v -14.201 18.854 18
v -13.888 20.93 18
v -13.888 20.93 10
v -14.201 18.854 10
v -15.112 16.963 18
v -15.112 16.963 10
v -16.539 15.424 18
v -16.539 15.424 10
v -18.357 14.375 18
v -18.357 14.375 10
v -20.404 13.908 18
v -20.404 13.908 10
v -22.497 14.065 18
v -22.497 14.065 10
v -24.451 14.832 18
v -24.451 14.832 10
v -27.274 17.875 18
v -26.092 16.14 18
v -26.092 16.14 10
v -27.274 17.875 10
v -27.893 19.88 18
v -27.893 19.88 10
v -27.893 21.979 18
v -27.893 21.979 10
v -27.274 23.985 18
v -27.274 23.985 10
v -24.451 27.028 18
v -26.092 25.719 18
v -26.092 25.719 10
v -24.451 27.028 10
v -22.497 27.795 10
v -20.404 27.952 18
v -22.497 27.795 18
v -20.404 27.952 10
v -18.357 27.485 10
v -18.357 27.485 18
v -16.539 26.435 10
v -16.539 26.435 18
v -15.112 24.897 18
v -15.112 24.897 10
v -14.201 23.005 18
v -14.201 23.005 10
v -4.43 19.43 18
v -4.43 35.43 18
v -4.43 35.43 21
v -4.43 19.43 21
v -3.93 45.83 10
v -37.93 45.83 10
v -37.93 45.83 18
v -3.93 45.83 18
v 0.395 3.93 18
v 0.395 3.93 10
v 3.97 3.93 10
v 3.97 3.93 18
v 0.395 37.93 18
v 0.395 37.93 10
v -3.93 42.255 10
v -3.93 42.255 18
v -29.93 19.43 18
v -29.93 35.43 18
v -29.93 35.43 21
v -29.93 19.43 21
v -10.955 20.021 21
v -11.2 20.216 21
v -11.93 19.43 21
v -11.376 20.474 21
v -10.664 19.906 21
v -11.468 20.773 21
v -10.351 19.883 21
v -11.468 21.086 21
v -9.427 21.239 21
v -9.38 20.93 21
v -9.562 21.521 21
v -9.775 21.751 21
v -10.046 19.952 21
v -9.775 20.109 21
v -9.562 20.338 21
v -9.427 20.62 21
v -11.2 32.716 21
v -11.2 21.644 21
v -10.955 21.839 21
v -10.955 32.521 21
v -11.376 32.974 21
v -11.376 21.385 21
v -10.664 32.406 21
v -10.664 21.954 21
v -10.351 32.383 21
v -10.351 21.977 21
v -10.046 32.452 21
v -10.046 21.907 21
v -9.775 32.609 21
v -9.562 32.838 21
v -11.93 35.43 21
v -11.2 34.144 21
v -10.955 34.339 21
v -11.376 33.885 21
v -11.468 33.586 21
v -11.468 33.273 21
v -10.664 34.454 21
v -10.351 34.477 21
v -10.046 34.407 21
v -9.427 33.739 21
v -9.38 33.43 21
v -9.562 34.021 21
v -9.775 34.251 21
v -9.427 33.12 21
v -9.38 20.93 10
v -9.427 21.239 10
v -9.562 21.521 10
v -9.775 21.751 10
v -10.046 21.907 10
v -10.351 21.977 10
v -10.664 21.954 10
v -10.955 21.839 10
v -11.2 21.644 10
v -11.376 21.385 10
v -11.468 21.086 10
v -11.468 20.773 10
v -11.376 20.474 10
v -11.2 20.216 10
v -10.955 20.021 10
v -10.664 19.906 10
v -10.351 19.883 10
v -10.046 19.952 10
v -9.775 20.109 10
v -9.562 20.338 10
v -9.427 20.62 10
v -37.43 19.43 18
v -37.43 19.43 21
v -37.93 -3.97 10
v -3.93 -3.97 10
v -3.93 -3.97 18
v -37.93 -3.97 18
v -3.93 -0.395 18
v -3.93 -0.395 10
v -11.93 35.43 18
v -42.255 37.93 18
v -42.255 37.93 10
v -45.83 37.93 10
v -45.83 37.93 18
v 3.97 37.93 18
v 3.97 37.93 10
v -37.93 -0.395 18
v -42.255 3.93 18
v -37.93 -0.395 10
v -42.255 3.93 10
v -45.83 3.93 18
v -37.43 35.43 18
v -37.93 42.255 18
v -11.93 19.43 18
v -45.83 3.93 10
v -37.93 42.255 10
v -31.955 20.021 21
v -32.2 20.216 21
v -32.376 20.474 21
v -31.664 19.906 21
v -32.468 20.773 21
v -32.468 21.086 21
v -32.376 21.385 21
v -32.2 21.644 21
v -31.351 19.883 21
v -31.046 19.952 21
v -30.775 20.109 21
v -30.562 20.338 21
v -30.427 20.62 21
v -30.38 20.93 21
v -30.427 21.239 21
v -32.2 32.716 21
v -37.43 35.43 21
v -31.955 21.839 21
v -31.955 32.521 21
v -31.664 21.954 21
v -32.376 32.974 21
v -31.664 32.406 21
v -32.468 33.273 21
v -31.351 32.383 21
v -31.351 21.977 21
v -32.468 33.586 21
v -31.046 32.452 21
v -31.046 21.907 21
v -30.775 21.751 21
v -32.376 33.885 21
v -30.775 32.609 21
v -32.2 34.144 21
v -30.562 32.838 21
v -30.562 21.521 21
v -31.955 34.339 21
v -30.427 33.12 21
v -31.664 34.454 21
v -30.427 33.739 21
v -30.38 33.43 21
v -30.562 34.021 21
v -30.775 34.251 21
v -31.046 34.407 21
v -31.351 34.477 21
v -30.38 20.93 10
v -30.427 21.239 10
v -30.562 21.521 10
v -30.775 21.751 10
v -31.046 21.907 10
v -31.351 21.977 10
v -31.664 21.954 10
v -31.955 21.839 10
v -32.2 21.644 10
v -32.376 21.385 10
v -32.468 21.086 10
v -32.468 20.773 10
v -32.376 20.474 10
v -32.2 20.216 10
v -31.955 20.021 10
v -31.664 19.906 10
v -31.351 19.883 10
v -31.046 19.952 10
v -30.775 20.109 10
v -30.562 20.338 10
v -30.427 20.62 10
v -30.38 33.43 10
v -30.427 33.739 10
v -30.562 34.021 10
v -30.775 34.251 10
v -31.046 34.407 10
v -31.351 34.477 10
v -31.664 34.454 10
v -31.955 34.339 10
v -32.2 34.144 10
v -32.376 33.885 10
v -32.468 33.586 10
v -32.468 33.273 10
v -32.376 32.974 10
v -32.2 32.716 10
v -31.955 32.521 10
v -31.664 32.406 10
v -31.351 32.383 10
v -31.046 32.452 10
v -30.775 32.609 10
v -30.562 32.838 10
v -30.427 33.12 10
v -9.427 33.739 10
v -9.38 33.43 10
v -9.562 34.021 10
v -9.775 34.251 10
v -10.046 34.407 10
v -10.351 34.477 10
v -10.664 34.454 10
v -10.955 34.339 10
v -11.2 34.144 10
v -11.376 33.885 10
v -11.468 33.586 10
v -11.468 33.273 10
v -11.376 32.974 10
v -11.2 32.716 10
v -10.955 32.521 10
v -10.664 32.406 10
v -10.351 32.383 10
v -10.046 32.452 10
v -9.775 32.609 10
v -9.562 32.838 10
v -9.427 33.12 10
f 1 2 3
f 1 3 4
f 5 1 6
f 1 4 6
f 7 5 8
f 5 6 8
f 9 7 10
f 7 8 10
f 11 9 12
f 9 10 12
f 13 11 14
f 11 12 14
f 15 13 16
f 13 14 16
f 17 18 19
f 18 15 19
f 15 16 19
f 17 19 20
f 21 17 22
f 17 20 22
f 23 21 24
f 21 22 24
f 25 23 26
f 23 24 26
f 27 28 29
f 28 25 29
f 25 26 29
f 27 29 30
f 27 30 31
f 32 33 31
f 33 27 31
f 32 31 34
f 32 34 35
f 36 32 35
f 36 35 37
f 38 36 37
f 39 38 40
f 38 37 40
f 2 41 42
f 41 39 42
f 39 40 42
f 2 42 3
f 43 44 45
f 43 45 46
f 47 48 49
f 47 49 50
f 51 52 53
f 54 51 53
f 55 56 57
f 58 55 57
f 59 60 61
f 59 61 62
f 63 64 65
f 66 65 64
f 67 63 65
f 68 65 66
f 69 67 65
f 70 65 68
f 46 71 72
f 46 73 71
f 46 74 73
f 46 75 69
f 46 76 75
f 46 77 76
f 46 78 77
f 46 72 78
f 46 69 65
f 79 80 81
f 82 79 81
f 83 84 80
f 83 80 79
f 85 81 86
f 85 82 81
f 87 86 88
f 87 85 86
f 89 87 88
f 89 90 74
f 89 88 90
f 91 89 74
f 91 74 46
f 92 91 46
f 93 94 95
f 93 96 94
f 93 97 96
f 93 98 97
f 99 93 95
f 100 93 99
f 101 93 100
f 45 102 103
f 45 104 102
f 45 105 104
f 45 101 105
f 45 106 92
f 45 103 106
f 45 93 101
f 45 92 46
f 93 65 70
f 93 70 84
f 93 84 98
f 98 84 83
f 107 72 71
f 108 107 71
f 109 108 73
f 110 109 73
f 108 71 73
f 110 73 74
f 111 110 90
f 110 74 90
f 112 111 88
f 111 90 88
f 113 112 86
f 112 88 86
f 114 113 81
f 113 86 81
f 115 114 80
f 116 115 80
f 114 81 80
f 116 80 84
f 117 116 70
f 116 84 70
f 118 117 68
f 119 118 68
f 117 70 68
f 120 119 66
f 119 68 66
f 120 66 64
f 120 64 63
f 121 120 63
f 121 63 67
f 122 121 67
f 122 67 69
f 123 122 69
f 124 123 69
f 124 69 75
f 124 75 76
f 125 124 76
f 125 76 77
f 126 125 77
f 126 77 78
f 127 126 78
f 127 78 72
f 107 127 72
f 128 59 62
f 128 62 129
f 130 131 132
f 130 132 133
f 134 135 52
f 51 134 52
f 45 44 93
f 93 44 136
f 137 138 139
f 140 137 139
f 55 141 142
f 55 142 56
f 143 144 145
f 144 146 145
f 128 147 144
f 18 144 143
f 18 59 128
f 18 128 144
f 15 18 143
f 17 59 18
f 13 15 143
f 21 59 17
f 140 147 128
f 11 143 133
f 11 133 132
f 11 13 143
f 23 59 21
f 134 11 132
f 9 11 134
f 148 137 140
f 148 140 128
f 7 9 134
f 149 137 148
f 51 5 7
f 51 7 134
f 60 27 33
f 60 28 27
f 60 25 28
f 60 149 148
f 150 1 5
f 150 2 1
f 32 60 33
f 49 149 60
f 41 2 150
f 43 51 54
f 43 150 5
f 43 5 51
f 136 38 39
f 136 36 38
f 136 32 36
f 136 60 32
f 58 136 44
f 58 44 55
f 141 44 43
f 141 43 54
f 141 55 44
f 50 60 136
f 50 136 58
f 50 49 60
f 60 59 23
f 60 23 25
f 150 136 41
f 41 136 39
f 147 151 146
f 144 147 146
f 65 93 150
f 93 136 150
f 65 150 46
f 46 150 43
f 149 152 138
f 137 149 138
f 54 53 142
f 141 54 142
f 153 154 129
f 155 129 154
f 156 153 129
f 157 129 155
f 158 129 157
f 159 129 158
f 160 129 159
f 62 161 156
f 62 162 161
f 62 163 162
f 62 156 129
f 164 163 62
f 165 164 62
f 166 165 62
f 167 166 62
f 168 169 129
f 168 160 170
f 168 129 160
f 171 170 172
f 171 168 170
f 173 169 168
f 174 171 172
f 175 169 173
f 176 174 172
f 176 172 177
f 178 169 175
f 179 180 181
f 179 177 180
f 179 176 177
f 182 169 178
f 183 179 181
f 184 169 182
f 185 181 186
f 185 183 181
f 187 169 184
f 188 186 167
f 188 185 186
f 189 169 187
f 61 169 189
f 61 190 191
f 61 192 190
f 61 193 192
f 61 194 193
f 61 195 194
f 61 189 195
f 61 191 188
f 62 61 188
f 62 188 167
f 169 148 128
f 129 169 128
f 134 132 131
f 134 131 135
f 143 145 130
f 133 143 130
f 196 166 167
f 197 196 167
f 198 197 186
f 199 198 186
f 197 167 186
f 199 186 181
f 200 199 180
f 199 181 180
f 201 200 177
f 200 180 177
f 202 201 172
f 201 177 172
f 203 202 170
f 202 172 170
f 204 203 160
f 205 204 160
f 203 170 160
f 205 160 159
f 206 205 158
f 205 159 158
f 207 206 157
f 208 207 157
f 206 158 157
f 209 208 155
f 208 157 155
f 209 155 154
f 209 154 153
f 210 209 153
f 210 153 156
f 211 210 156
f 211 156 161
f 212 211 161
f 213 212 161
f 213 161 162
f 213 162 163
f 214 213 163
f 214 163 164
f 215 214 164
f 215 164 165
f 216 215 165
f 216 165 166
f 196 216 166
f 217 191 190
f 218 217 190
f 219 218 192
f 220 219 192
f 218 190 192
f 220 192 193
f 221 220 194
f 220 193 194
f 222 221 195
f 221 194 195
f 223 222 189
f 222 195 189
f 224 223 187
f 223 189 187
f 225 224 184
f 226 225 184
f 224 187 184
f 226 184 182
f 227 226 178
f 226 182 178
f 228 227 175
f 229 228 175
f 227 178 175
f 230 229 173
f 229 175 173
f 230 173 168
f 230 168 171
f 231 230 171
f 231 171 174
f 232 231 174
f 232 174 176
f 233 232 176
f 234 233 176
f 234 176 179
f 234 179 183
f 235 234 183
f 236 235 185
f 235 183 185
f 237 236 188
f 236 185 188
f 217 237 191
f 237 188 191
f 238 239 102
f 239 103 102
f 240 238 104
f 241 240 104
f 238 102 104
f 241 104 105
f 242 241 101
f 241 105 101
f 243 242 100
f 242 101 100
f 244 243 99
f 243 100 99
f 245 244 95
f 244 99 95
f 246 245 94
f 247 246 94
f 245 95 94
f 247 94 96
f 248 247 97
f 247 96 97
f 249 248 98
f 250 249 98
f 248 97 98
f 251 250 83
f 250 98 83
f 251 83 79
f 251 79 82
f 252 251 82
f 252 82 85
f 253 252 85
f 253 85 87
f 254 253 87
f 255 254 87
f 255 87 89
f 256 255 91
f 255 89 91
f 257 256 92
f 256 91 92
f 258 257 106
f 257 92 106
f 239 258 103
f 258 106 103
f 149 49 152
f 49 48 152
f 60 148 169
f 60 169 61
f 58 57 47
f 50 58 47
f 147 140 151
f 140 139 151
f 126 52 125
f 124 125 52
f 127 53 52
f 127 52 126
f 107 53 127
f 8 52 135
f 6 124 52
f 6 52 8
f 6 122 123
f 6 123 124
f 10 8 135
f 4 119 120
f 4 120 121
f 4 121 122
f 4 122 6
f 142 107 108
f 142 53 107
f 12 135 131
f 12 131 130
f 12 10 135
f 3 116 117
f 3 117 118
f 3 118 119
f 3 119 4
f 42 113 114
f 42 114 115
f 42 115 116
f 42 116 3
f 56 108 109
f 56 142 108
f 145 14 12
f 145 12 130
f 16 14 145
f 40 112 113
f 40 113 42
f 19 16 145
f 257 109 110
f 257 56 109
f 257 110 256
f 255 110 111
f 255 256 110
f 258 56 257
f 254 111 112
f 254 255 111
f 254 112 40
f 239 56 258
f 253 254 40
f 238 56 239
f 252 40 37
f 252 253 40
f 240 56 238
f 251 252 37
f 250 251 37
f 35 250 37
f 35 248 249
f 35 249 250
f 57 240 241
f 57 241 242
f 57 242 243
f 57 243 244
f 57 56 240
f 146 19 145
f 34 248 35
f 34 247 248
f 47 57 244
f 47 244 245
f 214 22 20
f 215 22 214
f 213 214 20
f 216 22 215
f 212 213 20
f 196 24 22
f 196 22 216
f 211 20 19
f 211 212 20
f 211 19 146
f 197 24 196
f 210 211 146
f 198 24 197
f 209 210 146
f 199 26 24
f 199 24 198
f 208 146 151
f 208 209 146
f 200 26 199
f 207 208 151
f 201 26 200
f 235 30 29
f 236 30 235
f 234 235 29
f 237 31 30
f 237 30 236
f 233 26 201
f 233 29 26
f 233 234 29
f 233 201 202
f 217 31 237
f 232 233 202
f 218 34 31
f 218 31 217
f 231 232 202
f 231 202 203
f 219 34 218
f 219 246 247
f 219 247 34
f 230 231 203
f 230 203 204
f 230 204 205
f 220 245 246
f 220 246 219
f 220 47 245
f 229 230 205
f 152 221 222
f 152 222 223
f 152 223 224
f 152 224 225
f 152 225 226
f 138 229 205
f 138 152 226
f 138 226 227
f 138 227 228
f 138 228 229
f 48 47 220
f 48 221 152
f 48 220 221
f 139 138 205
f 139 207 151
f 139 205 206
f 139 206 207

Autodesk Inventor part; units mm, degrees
ref_plane "YZ Plane" through (0, 0, 0) normal (1, 0, 0) x (0, 1, 0)
ref_plane "Work Plane1" through (0, 0, 10) normal (0, 0, 1) x (1, 0, 0)
sketch "Sketch1" plane through (0, 0, 10) normal (0, 0, 1) x (1, 0, 0)
  line L0 (-4.0299, -0.3538) -> (-2.2322, 1.4439) construction
  arc A0 (-1.4439, 2.2322) -> (-2.2322, 1.4439) centre (-0.9299, 0.9299) ccw construction
  line L1 (-1.4439, 2.2322) -> (0.3538, 4.0299) construction
  line L2 (-37.8299, 42.2137) -> (-37.8299, 45.8299) construction
  line L3 (-37.8299, 45.8299) -> (-4.0299, 45.8299) construction
  line L4 (-4.0299, 45.8299) -> (-4.0299, 42.2137) construction
  line L5 (-4.0299, 4.0299) -> (0.3538, 4.0299) projected
  circle A1 centre (-20.9299, 20.9299) radius 17.5 projected
  line L6 (-20.9299, 58.9723) -> (17.1124, 20.9299) construction
  line L7 (17.1124, 20.9299) -> (-20.9299, -17.1124) construction
  line L8 (-20.9299, -17.1124) -> (-58.9723, 20.9299) construction
  line L9 (-58.9723, 20.9299) -> (-20.9299, 58.9723) construction
  line L10 (-20.9299, 58.9723) -> (-20.9299, -17.1124) construction
  line L11 (17.1124, 20.9299) -> (-58.9723, 20.9299) construction
  line L12 (-20.9299, 58.9723) -> (32.8701, 58.9723) construction
  line L13 (-43.4299, 43.4299) -> (1.5701, 43.4299) construction
  line L14 (1.5701, 43.4299) -> (1.5701, -1.5701) construction
  line L15 (1.5701, -1.5701) -> (-43.4299, -1.5701) construction
  line L16 (-43.4299, -1.5701) -> (-43.4299, 43.4299) construction
  line L17 (-43.4299, 43.4299) -> (1.5701, -1.5701) construction
  line L18 (1.5701, 43.4299) -> (-43.4299, -1.5701) construction
  line L19 (-43.4299, 5.3876) -> (-43.4299, 36.4723)
  line L20 (-43.4299, 36.4723) -> (-36.4723, 43.4299)
  line L21 (-36.4723, 43.4299) -> (-5.3876, 43.4299)
  line L22 (-5.3876, 43.4299) -> (1.5701, 36.4723)
  line L23 (1.5701, 36.4723) -> (1.5701, 5.3876)
  line L24 (1.5701, 5.3876) -> (-5.3876, -1.5701)
  line L25 (-5.3876, -1.5701) -> (-36.4723, -1.5701)
  line L26 (-36.4723, -1.5701) -> (-43.4299, 5.3876)
  line L27 (-4.0299, 42.2137) -> (-37.8299, 42.2137) projected
  line L28 (-4.0299, -0.3538) -> (-4.0299, 4.0299) projected
  circle A2 centre (-20.9299, 20.9299) radius 7.0417
  point P0 (-37.8299, 4.0299)
  dimension "d18" = 53.8
  dimension "d19" = 45
  dimension "d20" = 53.8
  dimension "d21" = 45
  dimension "d22" = 45
extrude "Extrusion1" add sketch "Sketch1" along normal blind 8 contours L28 L24 L25 L26 L19 L20 L27 L22 L23 L5 | L5 L24 L28 | L27 L20 L21 L22 | A1
sketch "Sketch3" plane through (0, 0, 10) normal (0, 0, -1) x (-1, 0, 0)
  line L0 (37.8299, -0.4701) -> (37.8299, 4.0299) construction
  line L1 (4.0299, 4.0299) -> (4.0299, -0.4701) construction
  line L2 (37.8299, -0.4701) -> (37.8299, 1.1886) construction
  line L3 (4.0299, -3.9701) -> (4.0299, -0.3538) construction
  line L4 (45.8299, 4.0299) -> (42.2137, 4.0299) construction
  line L5 (-0.3538, 4.0299) -> (-3.9701, 4.0299) construction
  line L6 (-3.9701, 37.8299) -> (-0.3538, 37.8299) construction
  line L7 (4.0299, 42.2137) -> (4.0299, 45.8299) construction
  line L8 (37.8299, 45.8299) -> (37.8299, 42.2137) construction
  line L9 (42.2137, 37.8299) -> (45.8299, 37.8299) construction
  line L10 (37.8299, 37.7299) -> (45.8299, 37.7299)
  line L11 (45.8299, 37.7299) -> (45.8299, 4.1299)
  line L12 (45.8299, 4.1299) -> (37.8299, 4.1299)
  line L13 (37.8299, 4.1299) -> (37.8299, 37.7299)
  line L14 (37.7299, 4.0299) -> (4.1299, 4.0299)
  line L15 (4.1299, 4.0299) -> (4.1299, -3.9701)
  line L16 (4.1299, -3.9701) -> (37.7299, -3.9701)
  line L17 (37.7299, -3.9701) -> (37.7299, 4.0299)
  line L18 (4.0299, 4.1299) -> (-3.9701, 4.1299)
  line L19 (-3.9701, 4.1299) -> (-3.9701, 37.7299)
  line L20 (-3.9701, 37.7299) -> (4.0299, 37.7299)
  line L21 (4.0299, 37.7299) -> (4.0299, 4.1299)
  line L22 (4.1299, 37.8299) -> (37.7299, 37.8299)
  line L23 (37.7299, 37.8299) -> (37.7299, 45.8299)
  line L24 (37.7299, 45.8299) -> (4.1299, 45.8299)
  line L25 (4.1299, 45.8299) -> (4.1299, 37.8299)
  point P0 (0, 0)
  dimension "d23" = 0.1
  dimension "d24" = 0.1
  dimension "d25" = 0.1
  dimension "d26" = 0.1
  dimension "d27" = 0.1
extrude "Extrusion3" add sketch "Sketch3" against normal up to surface (8 mm away)
sketch "Sketch4" plane through (0, 0, 18) normal (0, 0, 1) x (1, 0, 0)
  line L0 (-33.4299, 35.4299) -> (-33.4299, 11.4299) construction
  line L1 (-33.4299, 11.4299) -> (-8.4299, 11.4299) construction
  line L2 (-8.4299, 11.4299) -> (-8.4299, 35.4299) construction
  line L3 (-8.4299, 35.4299) -> (-33.4299, 35.4299) construction
  circle A0 centre (-10.4299, 33.4299) radius 1.05 construction
  circle A1 centre (-10.4299, 20.9299) radius 1.05 construction
  circle A2 centre (-31.4299, 20.9299) radius 1.05 construction
  circle A3 centre (-31.4299, 33.4299) radius 1.05 construction
  line L4 (-15.4299, 29.8299) -> (-12.4299, 29.8299) construction
  line L5 (-15.4299, 31.8299) -> (-15.4299, 29.8299) construction
  line L6 (-12.4299, 31.8299) -> (-15.4299, 31.8299) construction
  line L7 (-12.4299, 29.8299) -> (-12.4299, 31.8299) construction
  line L8 (-8.4299, 35.4299) -> (-11.9299, 35.4299)
  line L9 (-11.9299, 35.4299) -> (-11.9299, 19.4299)
  line L10 (-11.9299, 19.4299) -> (-8.4299, 19.4299)
  line L11 (-8.4299, 19.4299) -> (-8.4299, 35.4299)
  line L12 (-33.4299, 35.4299) -> (-29.9299, 35.4299)
  line L13 (-29.9299, 35.4299) -> (-29.9299, 19.4299)
  line L14 (-29.9299, 19.4299) -> (-33.4299, 19.4299)
  line L15 (-33.4299, 19.4299) -> (-33.4299, 35.4299)
  line L16 (-33.4299, 35.4299) -> (-37.4299, 35.4299)
  line L17 (-37.4299, 35.4299) -> (-37.4299, 19.4299)
  line L18 (-37.4299, 19.4299) -> (-33.4299, 19.4299)
  line L19 (-33.4299, 19.4299) -> (-33.4299, 35.4299)
  line L20 (-8.4299, 35.4299) -> (-4.4299, 35.4299)
  line L21 (-4.4299, 35.4299) -> (-4.4299, 19.4299)
  line L22 (-4.4299, 19.4299) -> (-8.4299, 19.4299)
  line L23 (-8.4299, 19.4299) -> (-8.4299, 35.4299)
  point P0 (0, 0)
  dimension "d30" = 3.5
  dimension "d31" = 16
  dimension "d32" = 3.5
  dimension "d37" = 4
  dimension "d38" = 4
ref_plane "Work Plane3" through (-33.4299, 11.4299, 16.4) normal (0, 0, -1) x (0, 1, 0)
extrude "Extrusion4" add sketch "Sketch4" along normal blind 3
sketch "Sketch5" plane through (-11.9299, 35.4299, 21) normal (0, 0, 1) x (1, 0, 0)
  circle A0 centre (1.5, -14.5) radius 1.05 projected
  circle A1 centre (1.5, -2) radius 1.05 projected
  circle A2 centre (-19.5, -2) radius 1.05 projected
  circle A3 centre (-19.5, -14.5) radius 1.05 projected
  point P0 (11.9299, -35.4299)
extrude "Extrusion5" cut sketch "Sketch5" against normal through all
sketch "Skizze12" plane through (0, 0, 10) normal (0, 0, -1) x (-1, 0, 0)
  line L0 (-0.3124, 4.1299) -> (4.1299, -0.3124) projected
  line L1 (4.1299, -0.3124) -> (4.1299, -3.9701) projected
  line L2 (4.1299, -3.9701) -> (37.7299, -3.9701) construction
  line L3 (37.7299, -3.9701) -> (37.7299, -0.3124) projected
  line L4 (37.7299, -0.3124) -> (42.1723, 4.1299) projected
  line L5 (45.8299, 4.1299) -> (42.1723, 4.1299) projected
  line L6 (45.8299, 37.7299) -> (45.8299, 4.1299) construction
  line L7 (42.1723, 37.7299) -> (45.8299, 37.7299) projected
  line L8 (42.1723, 37.7299) -> (37.7299, 42.1723) projected
  line L9 (37.7299, 42.1723) -> (37.7299, 45.8299) projected
  line L10 (37.7299, 45.8299) -> (4.1299, 45.8299) construction
  line L11 (4.1299, 45.8299) -> (4.1299, 42.1723) projected
  line L12 (4.1299, 42.1723) -> (-0.3124, 37.7299) projected
  line L13 (-3.9701, 37.7299) -> (-0.3124, 37.7299) projected
  line L14 (-3.9701, 4.1299) -> (-3.9701, 37.7299) construction
  line L15 (-0.3124, 4.1299) -> (-3.9701, 4.1299) projected
  circle A0 centre (20.9299, 20.9299) radius 7.0417 construction
  line L16 (37.9299, -4.1701) -> (3.9299, -4.1701) construction
  line L17 (3.9299, -4.1701) -> (3.9299, -0.3953)
  line L18 (3.9299, -0.3953) -> (-0.3953, 3.9299)
  line L19 (-0.3953, 3.9299) -> (-4.1701, 3.9299)
  line L20 (-4.1701, 3.9299) -> (-4.1701, 37.9299) construction
  line L21 (-4.1701, 37.9299) -> (-0.3953, 37.9299)
  line L22 (-0.3953, 37.9299) -> (3.9299, 42.2551)
  line L23 (3.9299, 42.2551) -> (3.9299, 46.0299)
  line L24 (3.9299, 46.0299) -> (37.9299, 46.0299) construction
  line L25 (37.9299, 46.0299) -> (37.9299, 42.2551)
  line L26 (37.9299, 42.2551) -> (42.2551, 37.9299)
  line L27 (42.2551, 37.9299) -> (46.0299, 37.9299)
  line L28 (46.0299, 37.9299) -> (46.0299, 3.9299) construction
  line L29 (46.0299, 3.9299) -> (42.2551, 3.9299)
  line L30 (42.2551, 3.9299) -> (37.9299, -0.3953)
  line L31 (37.9299, -0.3953) -> (37.9299, -4.1701)
  line L32 (-3.9701, 37.7299) -> (-3.9701, 37.9299)
  line L33 (37.7299, 45.8299) -> (4.1299, 45.8299) projected
  line L34 (4.1299, 45.8299) -> (3.9299, 45.8299)
  line L35 (37.7299, 45.8299) -> (37.9299, 45.8299)
  line L36 (45.8299, 37.7299) -> (45.8299, 37.9299)
  line L37 (45.8299, 4.1299) -> (45.8299, 3.9299)
  line L38 (37.7299, -3.9701) -> (37.9299, -3.9701)
  line L39 (4.1299, -3.9701) -> (3.9299, -3.9701)
  line L40 (-3.9701, 4.1299) -> (-3.9701, 3.9299)
  point P0 (0, 0)
  dimension "d65" = 0.2
extrude "IM_offset" add sketch "Skizze12" against normal up to surface (8 mm away)
sketch "Sketch13" plane through (0, 0, 18) normal (0, 0, 1) x (1, 0, 0)
  line L0 (3.9701, 37.9299) -> (3.9701, 3.9299) projected
  line L1 (0.3953, 37.9299) -> (3.9701, 37.9299) projected
  line L2 (-3.9299, 42.2551) -> (0.3953, 37.9299) projected
  line L3 (-3.9299, 45.8299) -> (-3.9299, 42.2551) projected
  line L4 (-37.9299, 45.8299) -> (-3.9299, 45.8299) projected
  line L5 (-37.9299, 42.2551) -> (-37.9299, 45.8299) projected
  line L6 (-42.2551, 37.9299) -> (-37.9299, 42.2551) projected
  line L7 (-45.8299, 37.9299) -> (-42.2551, 37.9299) projected
  line L8 (-45.8299, 3.9299) -> (-45.8299, 37.9299) projected
  line L9 (-42.2551, 3.9299) -> (-45.8299, 3.9299) projected
  line L10 (-37.9299, -0.3953) -> (-42.2551, 3.9299) projected
  line L11 (-37.9299, -3.9701) -> (-37.9299, -0.3953) projected
  line L12 (-3.9299, -3.9701) -> (-37.9299, -3.9701) projected
  line L13 (-3.9299, -0.3953) -> (-3.9299, -3.9701) projected
  line L14 (0.3953, 3.9299) -> (-3.9299, -0.3953) projected
  line L15 (3.9701, 3.9299) -> (0.3953, 3.9299) projected
  circle A0 centre (-20.9299, 20.9299) radius 7.0417 projected
  line L16 (-33.2963, 30.7242) -> (-29.9299, 30.7242) projected
  line L17 (-29.9299, 30.7242) -> (-29.9299, 35.4299) projected
  line L18 (-29.9299, 35.4299) -> (-37.4299, 35.4299) projected
  line L19 (-37.4299, 35.4299) -> (-37.4299, 19.4299) projected
  line L20 (-37.4299, 19.4299) -> (-29.9299, 19.4299) projected
  line L21 (-29.9299, 19.4299) -> (-29.9299, 22.7242) projected
  line L22 (-29.9299, 22.7242) -> (-33.2963, 22.7242) projected
  line L23 (-33.2963, 22.7242) -> (-33.2963, 30.7242) projected
  circle A1 centre (-31.4299, 33.4299) radius 1.05 projected
  circle A2 centre (-31.4299, 20.9299) radius 1.05 projected
  line L24 (-8.2963, 22.7242) -> (-11.9299, 22.7242) projected
  line L25 (-11.9299, 22.7242) -> (-11.9299, 19.4299) projected
  line L26 (-11.9299, 19.4299) -> (-4.4299, 19.4299) projected
  line L27 (-4.4299, 19.4299) -> (-4.4299, 35.4299) projected
  line L28 (-4.4299, 35.4299) -> (-11.9299, 35.4299) projected
  line L29 (-11.9299, 35.4299) -> (-11.9299, 30.7242) projected
  line L30 (-11.9299, 30.7242) -> (-8.2963, 30.7242) projected
  line L31 (-8.2963, 30.7242) -> (-8.2963, 22.7242) projected
  circle A3 centre (-10.4299, 20.9299) radius 1.05 projected
  circle A4 centre (-10.4299, 33.4299) radius 1.05 projected
  point P0 (0, 0)
properties part number "20_Cube_Insert_RaspiCam_v3"
